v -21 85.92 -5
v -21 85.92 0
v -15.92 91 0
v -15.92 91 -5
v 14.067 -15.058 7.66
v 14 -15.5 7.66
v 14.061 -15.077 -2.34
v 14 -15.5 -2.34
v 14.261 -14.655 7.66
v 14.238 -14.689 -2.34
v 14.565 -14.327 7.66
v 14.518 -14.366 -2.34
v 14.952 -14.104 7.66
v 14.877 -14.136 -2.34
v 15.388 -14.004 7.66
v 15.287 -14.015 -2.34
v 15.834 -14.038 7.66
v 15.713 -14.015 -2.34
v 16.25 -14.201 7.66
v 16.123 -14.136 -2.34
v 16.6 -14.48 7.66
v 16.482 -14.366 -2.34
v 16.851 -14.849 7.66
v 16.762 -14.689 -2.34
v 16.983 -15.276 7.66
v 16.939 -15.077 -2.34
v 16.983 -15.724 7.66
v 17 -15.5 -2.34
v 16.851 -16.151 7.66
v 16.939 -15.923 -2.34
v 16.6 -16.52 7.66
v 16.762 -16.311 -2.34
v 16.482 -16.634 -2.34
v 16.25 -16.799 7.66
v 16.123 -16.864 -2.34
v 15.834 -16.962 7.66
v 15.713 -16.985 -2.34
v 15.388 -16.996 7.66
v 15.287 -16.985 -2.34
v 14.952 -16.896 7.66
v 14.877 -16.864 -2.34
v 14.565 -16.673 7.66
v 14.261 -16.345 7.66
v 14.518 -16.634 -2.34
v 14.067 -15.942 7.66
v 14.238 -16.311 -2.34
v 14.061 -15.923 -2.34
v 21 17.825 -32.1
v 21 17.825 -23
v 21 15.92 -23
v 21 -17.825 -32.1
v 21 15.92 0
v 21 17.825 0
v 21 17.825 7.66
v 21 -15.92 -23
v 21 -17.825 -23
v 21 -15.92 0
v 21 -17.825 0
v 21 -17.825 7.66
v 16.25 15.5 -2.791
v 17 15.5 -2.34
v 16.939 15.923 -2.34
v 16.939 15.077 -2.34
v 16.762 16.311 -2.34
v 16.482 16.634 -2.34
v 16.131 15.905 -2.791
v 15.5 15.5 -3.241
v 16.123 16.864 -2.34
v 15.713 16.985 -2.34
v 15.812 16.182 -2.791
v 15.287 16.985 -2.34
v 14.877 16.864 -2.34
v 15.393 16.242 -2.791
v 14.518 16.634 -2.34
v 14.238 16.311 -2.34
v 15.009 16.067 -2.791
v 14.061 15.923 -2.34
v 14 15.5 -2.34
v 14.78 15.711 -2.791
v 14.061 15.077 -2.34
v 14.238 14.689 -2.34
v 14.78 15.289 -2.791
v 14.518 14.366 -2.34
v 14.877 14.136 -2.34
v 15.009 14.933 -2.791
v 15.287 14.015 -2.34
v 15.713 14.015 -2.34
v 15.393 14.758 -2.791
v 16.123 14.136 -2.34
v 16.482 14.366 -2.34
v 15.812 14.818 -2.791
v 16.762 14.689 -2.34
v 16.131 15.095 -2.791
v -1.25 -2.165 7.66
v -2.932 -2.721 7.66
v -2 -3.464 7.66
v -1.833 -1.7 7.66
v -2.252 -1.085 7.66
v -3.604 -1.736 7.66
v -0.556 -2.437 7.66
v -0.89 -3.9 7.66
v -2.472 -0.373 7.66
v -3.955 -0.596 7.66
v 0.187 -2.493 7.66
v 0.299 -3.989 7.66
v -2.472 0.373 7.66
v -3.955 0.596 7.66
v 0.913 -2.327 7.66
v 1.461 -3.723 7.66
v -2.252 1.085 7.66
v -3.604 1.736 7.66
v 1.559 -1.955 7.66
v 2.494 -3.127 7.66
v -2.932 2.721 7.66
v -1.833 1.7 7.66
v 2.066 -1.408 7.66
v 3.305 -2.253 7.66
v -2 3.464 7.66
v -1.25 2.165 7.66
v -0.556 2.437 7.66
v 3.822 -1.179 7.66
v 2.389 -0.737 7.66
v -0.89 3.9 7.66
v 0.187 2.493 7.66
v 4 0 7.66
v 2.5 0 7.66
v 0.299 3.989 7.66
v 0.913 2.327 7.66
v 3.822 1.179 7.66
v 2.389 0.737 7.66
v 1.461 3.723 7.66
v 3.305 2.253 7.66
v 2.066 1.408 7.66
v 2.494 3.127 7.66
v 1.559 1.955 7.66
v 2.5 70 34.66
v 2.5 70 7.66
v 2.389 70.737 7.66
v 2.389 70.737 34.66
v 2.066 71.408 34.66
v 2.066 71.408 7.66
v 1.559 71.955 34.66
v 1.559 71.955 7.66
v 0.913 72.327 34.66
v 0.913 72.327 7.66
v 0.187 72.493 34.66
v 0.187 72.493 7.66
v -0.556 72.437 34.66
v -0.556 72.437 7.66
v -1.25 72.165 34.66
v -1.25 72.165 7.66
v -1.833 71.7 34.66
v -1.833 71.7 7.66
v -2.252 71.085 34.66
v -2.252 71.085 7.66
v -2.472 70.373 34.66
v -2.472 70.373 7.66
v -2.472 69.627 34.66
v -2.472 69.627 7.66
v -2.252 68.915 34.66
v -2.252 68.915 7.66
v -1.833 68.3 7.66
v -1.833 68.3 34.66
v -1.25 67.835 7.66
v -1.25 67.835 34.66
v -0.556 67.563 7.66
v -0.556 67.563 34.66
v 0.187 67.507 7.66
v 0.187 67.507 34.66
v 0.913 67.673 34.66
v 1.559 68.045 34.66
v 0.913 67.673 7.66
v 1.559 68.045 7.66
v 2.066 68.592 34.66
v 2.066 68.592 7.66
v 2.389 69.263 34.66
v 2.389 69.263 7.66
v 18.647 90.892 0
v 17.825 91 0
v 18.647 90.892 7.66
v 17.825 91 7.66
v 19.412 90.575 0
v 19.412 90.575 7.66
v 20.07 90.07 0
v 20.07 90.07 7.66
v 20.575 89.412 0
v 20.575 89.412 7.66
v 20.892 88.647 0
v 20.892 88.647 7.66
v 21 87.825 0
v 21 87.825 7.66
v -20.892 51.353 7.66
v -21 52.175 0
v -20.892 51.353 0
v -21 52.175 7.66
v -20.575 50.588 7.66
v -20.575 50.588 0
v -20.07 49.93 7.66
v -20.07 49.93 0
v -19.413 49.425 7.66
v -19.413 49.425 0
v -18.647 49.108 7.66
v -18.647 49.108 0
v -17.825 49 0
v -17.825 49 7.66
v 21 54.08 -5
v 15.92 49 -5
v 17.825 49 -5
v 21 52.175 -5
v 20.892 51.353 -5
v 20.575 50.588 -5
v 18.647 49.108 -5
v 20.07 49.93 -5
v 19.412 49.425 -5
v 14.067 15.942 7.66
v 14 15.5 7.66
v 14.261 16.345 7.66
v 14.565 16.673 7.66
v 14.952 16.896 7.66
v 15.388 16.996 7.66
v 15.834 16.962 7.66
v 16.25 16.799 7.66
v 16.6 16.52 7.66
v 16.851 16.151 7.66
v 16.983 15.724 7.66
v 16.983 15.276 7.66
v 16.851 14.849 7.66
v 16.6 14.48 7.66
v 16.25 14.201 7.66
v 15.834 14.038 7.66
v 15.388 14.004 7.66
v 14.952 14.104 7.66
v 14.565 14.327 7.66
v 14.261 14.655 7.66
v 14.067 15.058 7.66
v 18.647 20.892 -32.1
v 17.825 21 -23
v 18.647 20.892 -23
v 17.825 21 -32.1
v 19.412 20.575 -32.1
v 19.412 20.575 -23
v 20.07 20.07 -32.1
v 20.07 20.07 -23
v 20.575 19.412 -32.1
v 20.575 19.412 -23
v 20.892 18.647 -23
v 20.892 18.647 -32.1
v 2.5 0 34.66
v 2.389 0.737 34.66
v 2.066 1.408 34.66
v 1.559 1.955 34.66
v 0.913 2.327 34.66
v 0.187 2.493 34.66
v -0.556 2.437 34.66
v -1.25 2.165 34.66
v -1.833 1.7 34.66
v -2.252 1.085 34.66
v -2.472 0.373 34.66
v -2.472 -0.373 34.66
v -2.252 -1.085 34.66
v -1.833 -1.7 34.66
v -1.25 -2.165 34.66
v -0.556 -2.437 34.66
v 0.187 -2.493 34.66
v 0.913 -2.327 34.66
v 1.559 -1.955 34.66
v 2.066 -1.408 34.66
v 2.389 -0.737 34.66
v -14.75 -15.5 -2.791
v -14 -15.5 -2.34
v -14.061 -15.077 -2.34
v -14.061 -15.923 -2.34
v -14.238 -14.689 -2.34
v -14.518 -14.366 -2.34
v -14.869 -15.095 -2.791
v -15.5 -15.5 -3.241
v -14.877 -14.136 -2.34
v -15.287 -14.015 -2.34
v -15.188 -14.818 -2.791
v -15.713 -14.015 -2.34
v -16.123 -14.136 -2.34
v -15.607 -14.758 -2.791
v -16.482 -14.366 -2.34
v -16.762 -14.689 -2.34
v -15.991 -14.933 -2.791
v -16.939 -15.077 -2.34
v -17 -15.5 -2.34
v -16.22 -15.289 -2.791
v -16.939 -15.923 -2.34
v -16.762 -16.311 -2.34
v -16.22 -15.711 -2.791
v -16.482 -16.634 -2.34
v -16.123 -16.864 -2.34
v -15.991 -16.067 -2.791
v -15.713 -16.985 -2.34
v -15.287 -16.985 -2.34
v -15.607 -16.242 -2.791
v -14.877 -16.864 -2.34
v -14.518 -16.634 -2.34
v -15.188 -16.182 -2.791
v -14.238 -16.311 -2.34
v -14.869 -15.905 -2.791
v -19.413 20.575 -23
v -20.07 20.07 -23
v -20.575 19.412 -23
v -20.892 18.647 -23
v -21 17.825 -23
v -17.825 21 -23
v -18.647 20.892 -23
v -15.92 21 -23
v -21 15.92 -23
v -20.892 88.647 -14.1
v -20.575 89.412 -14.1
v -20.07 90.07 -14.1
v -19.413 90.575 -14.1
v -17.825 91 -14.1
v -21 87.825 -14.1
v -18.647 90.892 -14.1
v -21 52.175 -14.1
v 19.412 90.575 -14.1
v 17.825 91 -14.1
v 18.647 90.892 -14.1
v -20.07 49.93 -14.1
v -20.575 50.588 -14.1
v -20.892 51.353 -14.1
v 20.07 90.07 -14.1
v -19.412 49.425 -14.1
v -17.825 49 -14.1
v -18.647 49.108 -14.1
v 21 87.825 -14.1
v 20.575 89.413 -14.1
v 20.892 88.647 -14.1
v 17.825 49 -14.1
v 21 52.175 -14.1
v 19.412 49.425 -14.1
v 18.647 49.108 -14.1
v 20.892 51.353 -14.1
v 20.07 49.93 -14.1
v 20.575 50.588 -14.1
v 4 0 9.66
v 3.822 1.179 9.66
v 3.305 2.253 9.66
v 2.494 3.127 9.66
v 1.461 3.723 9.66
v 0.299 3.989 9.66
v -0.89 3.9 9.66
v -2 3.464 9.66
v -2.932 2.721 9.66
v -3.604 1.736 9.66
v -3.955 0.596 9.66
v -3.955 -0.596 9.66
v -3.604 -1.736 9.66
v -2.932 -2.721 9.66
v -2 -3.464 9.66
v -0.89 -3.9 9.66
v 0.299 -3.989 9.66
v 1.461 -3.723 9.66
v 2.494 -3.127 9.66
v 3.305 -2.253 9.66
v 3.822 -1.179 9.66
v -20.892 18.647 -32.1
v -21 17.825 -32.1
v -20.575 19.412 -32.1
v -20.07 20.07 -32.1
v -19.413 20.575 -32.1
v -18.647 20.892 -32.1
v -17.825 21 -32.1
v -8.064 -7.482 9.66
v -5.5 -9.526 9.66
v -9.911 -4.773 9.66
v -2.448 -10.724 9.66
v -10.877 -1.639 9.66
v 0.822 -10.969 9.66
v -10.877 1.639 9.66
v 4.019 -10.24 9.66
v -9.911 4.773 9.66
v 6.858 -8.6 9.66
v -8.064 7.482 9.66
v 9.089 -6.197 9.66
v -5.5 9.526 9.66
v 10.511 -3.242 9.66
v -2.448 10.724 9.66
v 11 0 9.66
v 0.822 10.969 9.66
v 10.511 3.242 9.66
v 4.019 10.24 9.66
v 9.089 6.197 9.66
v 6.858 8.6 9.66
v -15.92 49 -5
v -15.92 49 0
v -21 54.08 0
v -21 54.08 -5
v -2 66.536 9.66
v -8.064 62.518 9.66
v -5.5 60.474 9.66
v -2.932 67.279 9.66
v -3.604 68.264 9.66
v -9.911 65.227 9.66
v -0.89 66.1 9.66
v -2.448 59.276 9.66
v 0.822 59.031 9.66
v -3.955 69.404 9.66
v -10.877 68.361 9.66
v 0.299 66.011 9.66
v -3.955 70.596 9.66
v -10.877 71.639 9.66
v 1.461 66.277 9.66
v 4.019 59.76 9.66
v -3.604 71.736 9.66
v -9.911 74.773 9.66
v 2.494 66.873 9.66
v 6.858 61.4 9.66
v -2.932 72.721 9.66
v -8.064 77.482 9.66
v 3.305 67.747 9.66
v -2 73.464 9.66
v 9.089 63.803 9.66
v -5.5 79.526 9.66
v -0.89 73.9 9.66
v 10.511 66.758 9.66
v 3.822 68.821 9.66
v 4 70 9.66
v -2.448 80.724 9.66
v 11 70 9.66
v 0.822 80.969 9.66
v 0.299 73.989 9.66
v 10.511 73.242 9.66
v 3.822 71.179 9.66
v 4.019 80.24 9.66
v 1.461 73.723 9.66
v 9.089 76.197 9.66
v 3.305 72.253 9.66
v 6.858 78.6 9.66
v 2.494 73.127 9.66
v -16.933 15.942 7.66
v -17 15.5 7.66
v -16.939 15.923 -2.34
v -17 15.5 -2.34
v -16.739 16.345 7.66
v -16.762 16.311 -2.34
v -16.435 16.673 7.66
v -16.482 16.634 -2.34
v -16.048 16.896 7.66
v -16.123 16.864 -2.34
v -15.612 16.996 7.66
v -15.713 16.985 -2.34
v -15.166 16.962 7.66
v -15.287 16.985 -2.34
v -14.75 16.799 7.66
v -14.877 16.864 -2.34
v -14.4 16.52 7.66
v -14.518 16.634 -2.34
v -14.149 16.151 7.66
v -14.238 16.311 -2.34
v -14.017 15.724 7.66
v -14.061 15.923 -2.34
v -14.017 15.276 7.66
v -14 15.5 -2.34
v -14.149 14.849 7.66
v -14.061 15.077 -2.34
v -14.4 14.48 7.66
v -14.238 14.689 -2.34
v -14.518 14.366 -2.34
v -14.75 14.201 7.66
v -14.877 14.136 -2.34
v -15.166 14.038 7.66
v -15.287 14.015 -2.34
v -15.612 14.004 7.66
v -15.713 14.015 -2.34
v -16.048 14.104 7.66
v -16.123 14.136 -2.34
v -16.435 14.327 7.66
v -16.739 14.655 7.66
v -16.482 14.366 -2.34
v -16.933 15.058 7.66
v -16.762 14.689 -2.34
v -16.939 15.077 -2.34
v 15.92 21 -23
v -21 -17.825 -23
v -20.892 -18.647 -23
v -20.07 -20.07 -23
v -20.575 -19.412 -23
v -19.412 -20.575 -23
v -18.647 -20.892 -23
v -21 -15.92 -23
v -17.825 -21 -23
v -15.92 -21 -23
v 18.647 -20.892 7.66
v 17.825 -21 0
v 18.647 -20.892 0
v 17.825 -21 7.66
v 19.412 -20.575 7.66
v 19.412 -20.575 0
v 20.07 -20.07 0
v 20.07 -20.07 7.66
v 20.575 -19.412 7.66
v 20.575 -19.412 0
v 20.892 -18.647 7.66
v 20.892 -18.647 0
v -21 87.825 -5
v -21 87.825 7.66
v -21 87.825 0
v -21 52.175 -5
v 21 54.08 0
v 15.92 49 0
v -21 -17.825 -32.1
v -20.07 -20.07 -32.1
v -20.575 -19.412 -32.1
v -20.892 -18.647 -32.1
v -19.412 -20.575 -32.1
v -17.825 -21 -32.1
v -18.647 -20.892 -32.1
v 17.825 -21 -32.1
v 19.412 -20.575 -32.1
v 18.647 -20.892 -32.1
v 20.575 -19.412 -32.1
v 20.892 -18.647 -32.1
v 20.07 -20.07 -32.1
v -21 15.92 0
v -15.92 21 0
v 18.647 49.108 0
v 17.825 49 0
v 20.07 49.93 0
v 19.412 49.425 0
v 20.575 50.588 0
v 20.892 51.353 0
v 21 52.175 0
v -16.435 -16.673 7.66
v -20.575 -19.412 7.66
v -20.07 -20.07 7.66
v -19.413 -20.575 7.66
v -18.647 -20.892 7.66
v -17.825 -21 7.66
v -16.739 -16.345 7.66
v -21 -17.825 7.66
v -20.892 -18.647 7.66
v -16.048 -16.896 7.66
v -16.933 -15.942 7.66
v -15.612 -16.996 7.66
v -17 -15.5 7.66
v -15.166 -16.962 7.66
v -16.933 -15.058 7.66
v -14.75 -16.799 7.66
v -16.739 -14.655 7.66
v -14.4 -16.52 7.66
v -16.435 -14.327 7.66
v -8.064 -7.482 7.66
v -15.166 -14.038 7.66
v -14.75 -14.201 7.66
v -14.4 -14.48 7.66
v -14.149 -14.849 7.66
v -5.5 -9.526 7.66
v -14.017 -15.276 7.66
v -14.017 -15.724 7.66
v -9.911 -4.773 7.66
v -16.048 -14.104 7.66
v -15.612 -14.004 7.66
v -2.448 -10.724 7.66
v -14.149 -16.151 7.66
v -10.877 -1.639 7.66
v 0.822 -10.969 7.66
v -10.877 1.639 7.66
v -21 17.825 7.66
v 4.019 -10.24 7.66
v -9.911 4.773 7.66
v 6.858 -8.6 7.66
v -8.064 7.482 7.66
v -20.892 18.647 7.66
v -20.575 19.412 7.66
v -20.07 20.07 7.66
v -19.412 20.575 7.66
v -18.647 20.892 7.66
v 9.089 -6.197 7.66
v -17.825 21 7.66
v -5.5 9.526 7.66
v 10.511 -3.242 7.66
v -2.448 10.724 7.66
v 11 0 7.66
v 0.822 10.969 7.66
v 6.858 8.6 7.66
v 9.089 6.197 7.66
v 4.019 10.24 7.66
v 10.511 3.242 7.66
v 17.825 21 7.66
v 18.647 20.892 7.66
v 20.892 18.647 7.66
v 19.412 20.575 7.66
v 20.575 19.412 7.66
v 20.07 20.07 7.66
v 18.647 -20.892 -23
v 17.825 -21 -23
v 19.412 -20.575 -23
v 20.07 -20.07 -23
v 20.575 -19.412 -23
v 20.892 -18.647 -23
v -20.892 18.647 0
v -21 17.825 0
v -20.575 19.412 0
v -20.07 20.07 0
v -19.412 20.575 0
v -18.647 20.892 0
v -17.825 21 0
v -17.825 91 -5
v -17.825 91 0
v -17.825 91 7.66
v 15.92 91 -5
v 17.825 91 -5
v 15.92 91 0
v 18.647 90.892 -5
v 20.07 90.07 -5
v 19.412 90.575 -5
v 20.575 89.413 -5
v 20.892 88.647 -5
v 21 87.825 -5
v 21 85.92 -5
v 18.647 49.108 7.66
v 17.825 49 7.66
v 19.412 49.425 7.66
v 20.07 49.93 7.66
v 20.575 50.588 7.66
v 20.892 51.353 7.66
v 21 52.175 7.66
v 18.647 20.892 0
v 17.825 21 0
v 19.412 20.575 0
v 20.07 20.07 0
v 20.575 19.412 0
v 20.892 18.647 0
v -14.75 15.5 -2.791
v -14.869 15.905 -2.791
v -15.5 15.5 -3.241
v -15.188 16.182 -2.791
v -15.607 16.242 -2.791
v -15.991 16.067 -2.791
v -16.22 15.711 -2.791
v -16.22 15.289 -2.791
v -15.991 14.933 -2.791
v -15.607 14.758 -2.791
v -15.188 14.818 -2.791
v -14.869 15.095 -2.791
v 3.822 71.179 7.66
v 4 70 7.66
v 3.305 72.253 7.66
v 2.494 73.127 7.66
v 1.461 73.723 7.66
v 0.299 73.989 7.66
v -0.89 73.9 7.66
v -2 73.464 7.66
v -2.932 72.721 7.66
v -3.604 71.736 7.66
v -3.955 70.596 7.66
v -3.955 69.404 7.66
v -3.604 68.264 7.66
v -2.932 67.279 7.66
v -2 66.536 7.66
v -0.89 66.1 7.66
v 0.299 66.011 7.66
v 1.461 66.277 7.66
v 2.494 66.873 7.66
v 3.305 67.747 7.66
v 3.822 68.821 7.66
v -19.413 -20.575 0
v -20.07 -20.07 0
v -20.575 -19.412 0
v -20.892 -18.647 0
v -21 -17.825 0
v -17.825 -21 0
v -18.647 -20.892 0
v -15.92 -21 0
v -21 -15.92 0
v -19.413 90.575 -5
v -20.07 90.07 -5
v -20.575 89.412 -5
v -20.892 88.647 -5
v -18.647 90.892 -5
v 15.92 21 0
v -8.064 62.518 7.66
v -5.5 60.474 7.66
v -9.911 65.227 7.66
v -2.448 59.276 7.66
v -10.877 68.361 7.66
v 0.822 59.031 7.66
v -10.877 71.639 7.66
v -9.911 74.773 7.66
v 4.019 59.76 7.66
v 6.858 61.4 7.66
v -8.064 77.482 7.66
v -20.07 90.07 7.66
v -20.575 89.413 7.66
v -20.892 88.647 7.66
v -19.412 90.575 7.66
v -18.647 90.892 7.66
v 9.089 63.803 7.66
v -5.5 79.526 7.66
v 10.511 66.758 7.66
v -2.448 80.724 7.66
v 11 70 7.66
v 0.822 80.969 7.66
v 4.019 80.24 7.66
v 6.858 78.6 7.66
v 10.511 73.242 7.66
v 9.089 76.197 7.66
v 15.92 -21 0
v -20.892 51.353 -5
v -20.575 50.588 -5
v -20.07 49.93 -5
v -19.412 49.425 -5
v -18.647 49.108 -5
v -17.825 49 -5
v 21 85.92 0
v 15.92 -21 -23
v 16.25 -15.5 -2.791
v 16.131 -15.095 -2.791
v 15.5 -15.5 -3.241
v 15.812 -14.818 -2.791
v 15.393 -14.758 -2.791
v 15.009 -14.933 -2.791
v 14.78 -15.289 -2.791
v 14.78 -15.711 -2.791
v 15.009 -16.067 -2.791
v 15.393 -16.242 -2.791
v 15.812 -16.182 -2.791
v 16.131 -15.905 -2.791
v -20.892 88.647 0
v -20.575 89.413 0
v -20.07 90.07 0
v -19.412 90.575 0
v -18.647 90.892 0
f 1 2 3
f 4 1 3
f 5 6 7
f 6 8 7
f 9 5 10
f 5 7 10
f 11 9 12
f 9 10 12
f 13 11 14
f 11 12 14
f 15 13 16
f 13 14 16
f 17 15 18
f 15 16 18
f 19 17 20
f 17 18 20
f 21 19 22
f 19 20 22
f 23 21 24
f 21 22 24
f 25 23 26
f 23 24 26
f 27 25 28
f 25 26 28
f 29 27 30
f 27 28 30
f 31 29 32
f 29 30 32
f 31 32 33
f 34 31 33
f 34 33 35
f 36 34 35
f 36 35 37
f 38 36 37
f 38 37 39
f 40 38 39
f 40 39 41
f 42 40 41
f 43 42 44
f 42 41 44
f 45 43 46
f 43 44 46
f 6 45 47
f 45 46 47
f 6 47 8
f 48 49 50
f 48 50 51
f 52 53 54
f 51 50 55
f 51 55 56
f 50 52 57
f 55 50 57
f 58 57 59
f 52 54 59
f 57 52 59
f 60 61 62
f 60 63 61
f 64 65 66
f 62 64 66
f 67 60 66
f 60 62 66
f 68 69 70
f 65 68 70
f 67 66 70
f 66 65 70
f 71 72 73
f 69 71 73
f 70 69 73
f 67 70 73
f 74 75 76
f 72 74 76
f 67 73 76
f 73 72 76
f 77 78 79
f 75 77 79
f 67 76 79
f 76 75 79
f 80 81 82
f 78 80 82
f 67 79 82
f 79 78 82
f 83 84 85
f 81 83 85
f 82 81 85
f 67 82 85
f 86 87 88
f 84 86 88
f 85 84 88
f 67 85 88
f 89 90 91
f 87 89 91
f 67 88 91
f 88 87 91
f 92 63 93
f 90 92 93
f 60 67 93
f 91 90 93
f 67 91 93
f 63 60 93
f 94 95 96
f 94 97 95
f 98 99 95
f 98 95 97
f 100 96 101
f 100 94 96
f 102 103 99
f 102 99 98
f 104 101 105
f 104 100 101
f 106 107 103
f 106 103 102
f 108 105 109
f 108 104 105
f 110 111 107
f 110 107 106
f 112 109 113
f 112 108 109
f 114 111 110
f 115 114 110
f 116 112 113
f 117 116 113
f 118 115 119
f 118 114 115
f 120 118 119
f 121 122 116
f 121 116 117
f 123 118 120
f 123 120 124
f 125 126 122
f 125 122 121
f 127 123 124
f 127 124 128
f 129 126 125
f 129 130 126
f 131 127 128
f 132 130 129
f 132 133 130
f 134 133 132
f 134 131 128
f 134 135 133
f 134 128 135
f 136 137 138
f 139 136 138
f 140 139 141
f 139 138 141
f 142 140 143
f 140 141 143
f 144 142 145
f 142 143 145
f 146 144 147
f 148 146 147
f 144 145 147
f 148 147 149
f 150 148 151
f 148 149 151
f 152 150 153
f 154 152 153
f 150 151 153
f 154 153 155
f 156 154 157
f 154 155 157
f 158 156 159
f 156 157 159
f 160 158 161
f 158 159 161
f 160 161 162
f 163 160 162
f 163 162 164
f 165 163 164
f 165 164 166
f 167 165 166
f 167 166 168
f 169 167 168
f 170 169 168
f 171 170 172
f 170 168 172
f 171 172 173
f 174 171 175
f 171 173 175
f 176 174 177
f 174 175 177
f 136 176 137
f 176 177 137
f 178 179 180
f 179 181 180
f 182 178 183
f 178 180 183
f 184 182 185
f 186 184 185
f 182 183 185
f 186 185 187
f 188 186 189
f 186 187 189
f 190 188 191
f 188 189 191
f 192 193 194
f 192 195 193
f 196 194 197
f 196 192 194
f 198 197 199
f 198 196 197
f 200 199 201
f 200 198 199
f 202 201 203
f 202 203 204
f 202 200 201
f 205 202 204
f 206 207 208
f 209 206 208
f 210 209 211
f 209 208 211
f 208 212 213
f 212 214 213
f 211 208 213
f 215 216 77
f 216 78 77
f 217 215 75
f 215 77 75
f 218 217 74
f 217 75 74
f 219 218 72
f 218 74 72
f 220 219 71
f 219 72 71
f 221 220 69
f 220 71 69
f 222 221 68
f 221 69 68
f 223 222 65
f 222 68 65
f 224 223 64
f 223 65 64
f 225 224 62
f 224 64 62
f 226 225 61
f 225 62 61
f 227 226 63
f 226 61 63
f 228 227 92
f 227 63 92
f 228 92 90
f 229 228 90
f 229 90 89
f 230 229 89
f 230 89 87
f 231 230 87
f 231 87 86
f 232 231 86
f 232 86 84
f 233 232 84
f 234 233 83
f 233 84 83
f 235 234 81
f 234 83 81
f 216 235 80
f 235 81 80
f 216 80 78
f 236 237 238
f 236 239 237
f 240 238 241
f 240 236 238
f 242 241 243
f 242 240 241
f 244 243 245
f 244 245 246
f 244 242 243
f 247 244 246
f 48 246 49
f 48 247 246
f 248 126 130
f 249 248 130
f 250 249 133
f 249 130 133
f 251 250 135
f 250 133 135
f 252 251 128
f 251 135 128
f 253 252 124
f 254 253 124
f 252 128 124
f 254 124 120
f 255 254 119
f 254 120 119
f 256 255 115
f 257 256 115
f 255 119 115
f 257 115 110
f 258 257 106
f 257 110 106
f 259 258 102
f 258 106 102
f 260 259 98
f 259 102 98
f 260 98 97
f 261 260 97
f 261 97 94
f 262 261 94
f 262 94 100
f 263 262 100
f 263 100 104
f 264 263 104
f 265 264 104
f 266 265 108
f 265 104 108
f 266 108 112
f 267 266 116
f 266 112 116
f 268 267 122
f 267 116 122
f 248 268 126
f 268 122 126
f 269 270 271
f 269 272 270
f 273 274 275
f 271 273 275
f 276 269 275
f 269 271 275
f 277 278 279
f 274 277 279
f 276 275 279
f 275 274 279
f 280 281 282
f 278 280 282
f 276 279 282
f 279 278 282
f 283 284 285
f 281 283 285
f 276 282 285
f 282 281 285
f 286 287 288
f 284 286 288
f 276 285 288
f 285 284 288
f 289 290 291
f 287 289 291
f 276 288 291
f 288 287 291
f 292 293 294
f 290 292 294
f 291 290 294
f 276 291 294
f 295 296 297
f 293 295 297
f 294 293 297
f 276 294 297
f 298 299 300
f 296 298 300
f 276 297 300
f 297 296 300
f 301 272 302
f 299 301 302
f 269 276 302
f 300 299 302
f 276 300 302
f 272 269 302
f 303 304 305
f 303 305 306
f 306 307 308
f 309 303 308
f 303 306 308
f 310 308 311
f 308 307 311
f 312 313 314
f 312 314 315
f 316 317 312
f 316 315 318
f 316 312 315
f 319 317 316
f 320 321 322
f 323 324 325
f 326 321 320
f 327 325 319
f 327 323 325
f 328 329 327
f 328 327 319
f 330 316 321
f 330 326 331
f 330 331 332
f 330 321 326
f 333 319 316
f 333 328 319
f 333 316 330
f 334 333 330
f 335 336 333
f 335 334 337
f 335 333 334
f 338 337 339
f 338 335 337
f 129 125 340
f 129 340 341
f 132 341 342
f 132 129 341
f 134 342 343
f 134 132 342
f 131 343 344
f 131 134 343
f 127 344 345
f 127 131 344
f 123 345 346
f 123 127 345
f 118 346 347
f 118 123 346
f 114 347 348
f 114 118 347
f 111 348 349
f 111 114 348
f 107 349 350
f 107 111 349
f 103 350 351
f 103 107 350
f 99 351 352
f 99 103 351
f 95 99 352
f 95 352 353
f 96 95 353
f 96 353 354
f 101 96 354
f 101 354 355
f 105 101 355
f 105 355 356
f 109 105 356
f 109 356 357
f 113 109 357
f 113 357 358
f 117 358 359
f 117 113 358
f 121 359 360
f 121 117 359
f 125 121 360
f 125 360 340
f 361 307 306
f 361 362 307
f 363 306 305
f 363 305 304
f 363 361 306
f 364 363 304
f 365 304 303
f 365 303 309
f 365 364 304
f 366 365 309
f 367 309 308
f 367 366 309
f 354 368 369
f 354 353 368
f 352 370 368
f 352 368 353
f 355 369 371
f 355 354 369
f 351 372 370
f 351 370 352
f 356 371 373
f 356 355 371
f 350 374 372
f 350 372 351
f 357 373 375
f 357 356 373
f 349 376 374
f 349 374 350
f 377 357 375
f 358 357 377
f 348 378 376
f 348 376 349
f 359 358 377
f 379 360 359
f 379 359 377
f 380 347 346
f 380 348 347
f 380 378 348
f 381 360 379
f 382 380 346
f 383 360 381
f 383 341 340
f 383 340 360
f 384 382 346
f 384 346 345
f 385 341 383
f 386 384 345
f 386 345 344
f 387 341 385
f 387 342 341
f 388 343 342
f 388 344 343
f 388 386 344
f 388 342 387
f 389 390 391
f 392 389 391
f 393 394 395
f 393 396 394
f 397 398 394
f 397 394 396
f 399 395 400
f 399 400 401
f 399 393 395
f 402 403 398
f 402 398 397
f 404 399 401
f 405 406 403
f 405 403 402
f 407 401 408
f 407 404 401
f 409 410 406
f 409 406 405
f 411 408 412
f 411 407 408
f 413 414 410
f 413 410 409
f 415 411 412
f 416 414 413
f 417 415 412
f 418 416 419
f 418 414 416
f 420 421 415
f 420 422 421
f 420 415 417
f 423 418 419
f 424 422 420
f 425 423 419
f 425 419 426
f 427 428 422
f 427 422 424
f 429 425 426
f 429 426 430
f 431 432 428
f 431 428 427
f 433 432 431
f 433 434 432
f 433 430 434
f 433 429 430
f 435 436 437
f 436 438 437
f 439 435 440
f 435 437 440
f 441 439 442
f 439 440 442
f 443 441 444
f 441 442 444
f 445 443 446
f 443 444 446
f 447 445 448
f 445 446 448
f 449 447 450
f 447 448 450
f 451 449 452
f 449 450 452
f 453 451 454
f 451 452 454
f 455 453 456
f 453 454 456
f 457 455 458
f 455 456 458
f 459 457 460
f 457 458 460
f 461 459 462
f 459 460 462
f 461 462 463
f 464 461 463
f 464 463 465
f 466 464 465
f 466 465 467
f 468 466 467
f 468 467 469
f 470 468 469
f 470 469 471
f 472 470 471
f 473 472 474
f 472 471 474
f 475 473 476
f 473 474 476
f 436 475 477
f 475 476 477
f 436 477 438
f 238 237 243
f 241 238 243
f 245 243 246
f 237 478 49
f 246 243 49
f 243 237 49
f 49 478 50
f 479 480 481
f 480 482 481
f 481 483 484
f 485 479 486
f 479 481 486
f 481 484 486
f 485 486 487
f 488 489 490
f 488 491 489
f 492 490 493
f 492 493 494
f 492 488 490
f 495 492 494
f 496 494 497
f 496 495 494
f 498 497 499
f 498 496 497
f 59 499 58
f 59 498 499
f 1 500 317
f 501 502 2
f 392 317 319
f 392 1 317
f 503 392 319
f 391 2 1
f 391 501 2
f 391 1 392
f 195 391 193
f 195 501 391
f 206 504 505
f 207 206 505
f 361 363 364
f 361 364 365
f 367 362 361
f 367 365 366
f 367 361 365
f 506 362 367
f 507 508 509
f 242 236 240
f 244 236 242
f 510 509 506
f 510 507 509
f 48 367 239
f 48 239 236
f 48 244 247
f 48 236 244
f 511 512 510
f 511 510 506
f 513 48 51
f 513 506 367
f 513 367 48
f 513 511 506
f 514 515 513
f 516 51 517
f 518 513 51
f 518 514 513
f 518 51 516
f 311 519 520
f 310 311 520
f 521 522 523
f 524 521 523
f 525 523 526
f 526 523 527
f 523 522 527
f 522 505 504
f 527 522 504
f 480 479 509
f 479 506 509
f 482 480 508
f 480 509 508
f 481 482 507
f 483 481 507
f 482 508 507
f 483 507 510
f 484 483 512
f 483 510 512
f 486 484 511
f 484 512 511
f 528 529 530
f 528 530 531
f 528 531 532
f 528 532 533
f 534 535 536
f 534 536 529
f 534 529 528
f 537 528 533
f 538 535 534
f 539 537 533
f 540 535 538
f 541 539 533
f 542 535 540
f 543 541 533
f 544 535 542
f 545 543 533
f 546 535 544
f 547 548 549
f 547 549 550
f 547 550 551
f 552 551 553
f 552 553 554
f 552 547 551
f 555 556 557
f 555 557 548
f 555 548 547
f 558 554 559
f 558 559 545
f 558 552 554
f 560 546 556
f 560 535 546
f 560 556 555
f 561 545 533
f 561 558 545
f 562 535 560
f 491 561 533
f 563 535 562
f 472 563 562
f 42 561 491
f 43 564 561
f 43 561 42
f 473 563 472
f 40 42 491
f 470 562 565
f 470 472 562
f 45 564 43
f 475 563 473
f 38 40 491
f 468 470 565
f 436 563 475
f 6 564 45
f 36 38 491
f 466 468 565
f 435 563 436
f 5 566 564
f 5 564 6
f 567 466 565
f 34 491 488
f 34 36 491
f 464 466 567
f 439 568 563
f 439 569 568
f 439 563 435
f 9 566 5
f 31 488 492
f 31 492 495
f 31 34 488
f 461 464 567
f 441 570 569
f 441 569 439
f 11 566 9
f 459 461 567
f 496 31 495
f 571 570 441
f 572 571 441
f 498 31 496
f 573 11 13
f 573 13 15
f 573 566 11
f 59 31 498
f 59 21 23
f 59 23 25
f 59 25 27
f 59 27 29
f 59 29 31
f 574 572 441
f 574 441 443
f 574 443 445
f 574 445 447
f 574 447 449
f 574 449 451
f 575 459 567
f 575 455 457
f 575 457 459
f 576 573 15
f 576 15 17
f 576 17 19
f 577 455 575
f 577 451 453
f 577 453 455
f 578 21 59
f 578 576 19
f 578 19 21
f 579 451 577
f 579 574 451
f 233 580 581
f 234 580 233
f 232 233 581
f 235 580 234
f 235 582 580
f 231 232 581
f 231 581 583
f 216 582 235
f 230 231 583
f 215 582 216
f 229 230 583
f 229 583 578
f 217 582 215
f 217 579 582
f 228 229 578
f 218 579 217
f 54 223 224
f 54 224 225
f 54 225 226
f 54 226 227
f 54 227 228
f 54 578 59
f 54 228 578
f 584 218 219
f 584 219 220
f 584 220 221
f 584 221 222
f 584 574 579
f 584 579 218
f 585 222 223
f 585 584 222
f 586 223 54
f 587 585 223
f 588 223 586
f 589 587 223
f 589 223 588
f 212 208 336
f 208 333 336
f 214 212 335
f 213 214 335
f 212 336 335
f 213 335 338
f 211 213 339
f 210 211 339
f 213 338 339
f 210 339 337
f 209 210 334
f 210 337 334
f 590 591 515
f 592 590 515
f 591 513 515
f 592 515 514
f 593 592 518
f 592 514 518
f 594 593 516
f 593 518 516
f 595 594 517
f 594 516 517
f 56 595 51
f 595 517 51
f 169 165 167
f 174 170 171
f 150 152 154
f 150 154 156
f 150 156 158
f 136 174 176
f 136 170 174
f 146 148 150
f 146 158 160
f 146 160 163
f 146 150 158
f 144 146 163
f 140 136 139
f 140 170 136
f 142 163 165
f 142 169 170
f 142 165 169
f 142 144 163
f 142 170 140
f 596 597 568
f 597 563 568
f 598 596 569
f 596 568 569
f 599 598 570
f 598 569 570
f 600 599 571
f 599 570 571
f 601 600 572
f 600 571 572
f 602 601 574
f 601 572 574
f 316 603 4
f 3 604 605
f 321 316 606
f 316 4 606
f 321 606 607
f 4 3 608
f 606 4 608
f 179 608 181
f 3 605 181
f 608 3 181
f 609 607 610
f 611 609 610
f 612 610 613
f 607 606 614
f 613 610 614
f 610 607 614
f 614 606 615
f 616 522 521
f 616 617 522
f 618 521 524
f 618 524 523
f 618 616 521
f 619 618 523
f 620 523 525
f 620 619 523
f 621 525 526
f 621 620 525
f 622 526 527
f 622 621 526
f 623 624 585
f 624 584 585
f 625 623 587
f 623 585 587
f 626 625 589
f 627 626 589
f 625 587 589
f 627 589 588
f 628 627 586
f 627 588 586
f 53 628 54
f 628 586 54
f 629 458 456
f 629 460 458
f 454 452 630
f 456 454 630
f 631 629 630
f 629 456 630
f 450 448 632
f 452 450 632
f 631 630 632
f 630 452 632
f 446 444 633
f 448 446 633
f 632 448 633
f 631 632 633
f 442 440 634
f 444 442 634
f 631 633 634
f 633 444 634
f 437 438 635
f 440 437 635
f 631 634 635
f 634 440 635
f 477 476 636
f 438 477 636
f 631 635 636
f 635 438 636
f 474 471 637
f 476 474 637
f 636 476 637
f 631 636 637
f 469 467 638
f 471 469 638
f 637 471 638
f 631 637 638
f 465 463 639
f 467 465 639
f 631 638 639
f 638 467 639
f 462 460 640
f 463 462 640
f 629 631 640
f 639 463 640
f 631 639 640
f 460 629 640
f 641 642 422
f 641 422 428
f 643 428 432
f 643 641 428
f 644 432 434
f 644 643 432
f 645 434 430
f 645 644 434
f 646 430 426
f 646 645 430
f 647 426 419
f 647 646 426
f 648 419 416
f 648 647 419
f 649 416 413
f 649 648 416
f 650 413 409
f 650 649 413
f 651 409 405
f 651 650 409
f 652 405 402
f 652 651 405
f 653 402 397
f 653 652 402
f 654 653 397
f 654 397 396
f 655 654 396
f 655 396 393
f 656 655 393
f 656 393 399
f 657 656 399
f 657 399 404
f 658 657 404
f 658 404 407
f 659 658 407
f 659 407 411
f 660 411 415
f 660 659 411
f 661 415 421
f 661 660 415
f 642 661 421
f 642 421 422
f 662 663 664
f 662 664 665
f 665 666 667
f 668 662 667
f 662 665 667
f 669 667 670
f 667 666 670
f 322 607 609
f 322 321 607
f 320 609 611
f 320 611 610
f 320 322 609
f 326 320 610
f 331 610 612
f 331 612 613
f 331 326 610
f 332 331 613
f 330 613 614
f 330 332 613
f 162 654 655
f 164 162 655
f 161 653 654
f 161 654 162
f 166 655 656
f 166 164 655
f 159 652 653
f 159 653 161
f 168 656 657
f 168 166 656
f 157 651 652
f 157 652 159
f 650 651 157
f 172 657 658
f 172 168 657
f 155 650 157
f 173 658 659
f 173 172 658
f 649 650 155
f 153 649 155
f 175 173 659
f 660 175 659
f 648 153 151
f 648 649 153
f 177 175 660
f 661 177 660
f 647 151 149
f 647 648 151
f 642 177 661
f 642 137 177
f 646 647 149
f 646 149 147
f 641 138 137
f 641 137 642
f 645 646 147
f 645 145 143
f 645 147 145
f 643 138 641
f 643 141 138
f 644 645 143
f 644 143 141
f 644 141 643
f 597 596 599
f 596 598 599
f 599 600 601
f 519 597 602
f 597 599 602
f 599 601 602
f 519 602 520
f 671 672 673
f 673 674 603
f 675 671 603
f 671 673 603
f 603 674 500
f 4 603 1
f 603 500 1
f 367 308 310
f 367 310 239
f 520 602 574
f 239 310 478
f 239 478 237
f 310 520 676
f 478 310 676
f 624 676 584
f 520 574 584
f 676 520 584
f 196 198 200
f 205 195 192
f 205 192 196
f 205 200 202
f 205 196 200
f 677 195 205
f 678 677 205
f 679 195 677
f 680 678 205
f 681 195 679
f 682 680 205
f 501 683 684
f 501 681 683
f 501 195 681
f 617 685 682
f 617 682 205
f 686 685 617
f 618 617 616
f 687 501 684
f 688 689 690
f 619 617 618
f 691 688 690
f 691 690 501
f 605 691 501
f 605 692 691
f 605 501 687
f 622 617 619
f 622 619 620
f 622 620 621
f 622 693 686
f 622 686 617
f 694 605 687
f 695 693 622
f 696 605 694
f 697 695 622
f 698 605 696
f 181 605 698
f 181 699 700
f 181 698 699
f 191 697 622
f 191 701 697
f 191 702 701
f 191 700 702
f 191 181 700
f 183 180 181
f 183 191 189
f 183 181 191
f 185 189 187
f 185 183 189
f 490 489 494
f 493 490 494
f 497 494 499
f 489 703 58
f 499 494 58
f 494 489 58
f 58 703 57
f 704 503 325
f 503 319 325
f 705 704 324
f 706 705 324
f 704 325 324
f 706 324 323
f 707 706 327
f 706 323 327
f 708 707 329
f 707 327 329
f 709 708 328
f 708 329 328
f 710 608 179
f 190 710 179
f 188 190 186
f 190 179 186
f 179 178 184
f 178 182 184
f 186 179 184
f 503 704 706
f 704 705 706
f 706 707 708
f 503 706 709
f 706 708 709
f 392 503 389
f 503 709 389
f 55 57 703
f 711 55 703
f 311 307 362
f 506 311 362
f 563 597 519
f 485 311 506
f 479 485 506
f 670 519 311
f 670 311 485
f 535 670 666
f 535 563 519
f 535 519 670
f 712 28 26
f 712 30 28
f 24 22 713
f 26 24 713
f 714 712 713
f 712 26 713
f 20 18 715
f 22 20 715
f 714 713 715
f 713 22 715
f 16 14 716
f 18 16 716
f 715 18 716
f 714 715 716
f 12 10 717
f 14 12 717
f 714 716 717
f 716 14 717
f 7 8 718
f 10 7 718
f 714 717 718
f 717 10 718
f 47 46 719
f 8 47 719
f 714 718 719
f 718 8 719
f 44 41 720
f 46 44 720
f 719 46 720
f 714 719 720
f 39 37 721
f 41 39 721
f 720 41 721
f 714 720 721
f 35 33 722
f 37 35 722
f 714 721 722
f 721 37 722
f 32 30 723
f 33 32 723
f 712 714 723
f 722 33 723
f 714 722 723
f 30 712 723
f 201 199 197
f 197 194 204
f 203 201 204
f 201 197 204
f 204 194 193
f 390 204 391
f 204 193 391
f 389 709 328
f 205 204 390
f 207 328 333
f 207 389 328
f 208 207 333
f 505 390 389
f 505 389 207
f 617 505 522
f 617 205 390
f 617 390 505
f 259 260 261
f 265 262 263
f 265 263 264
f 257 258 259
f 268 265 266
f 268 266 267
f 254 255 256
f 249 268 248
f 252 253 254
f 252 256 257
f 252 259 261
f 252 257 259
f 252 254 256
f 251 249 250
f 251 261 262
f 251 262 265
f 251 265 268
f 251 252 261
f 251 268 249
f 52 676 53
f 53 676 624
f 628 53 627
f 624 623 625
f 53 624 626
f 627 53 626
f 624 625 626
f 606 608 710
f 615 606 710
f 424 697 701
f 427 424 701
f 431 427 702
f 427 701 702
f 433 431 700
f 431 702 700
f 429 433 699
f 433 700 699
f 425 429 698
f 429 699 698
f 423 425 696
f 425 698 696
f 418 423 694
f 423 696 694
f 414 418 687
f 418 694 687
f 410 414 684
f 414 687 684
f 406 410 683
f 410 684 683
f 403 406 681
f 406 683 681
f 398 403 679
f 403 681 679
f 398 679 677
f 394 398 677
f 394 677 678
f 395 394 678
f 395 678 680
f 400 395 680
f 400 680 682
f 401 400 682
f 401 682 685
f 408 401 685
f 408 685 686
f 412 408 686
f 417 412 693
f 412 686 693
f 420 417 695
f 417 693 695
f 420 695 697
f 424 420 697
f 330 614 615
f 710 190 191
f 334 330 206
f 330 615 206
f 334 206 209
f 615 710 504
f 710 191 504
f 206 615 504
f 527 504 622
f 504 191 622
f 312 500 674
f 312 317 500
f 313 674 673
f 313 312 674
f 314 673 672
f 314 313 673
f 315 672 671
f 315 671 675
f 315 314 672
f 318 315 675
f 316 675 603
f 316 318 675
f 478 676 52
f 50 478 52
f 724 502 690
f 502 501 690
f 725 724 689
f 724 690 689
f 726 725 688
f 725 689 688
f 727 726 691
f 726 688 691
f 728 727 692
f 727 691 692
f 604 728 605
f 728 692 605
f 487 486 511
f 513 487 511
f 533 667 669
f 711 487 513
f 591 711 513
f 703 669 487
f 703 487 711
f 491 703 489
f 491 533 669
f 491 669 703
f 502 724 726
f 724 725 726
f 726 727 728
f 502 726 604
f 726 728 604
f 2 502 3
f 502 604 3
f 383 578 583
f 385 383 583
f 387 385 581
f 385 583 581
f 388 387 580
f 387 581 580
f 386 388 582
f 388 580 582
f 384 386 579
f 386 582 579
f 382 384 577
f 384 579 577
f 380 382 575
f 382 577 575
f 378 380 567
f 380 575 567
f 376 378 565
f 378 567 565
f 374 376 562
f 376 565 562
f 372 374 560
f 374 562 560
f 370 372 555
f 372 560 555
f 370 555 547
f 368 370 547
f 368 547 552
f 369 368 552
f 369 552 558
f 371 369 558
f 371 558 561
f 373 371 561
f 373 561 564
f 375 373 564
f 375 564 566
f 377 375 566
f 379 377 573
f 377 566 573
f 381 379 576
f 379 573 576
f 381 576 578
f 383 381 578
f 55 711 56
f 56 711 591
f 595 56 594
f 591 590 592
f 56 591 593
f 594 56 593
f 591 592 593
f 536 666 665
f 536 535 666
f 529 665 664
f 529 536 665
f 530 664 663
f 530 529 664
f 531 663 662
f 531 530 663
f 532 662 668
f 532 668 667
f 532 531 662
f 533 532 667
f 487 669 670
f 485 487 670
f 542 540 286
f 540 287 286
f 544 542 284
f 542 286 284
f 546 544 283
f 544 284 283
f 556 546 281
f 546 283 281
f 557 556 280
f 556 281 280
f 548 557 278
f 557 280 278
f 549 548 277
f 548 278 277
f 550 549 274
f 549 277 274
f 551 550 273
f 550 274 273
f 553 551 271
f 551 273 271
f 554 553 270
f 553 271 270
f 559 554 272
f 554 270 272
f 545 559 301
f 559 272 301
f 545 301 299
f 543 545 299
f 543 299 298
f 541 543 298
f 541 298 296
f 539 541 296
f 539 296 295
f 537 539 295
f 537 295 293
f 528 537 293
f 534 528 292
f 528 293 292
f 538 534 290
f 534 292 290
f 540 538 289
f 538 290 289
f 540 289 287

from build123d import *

# Parameters (mm, degrees)
F0_W      = 42
F0_H      = 42
F1_DEPTH  = 7.66
F2_R      = 11
F2_R_2    = 4
F3_DEPTH  = 2
F5_DEPTH  = 23
F6_DEPTH  = 5
F7_W      = 42
F7_H      = 42
F9_DEPTH  = 9.1
F8_W      = 42
F8_H      = 42
F10_R     = 3.175
F10_2_R   = 3.175
F11_D     = 3
F11_DEPTH = 10
F11_TIP   = 0.9012909285
F2_R_3    = 2.5
F12_DEPTH = 27


# Not quite as in the source:
# - a feature names something its author has since deleted; it is built from what else it names


with BuildPart() as f1:
    # F0 (on Top) → F1 (new body)
    with BuildSketch(Plane.XY):
        Rectangle(F0_W, F0_H)
    extrude(amount=F1_DEPTH)

    # F2 (on face) → F3 (join)
    with BuildSketch(Plane.XY.offset(7.66)):
        Circle(F2_R)
        Circle(F2_R_2, mode=Mode.SUBTRACT)
    extrude(amount=F3_DEPTH)

    # F4 (on face) → F5 (join)
    with BuildSketch(Plane(origin=(0, 0, 0), x_dir=(1, 0, 0), z_dir=(0, 0, -1))):
        Polygon((-21, -15.92), (-15.92, -21), (15.92, -21), (21, -15.92), (21, 15.92), (15.92, 21), (-15.92, 21), (-21, 15.92), align=None)
    extrude(amount=F5_DEPTH)

    # F7 (on face) → F9 (join)
    with BuildSketch(Plane(origin=(0, 0, -23), x_dir=(1, 0, 0), z_dir=(0, 0, -1))):
        Rectangle(F7_W, F7_H)
    extrude(amount=F9_DEPTH)

    # F10
    f10_edges = [f1.edges().sort_by_distance(p)[0] for p in [
        (21, 21, 3.83),
        (21, -21, 3.83),
        (-21, -21, 3.83),
        (-21, 21, 3.83),
        (21, -21, -27.55),
        (-21, 21, -27.55),
        (-21, -21, -27.55),
        (21, 21, -27.55),
    ]]
    fillet(f10_edges, radius=F10_R)

    # F11
    with Locations(Plane.XY.offset(7.66)):
        with Locations((15.5, 15.5), (-15.5, 15.5), (15.5, -15.5), (-15.5, -15.5), (15.5, 54.5), (-15.5, 54.5), (-15.5, 85.5), (15.5, 85.5)):
            Hole(F11_D / 2, depth=F11_DEPTH)
            with Locations((0, 0, -(F11_DEPTH + F11_TIP / 2))):  # 118° drill point
                Cone(0, F11_D / 2, F11_TIP, mode=Mode.SUBTRACT)

    # F2 (on face) → F12 (join)
    with BuildSketch(Plane.XY.offset(7.66)):
        Circle(F2_R_3)
    extrude(amount=F12_DEPTH)


with BuildPart() as f1b:
    # F0 (on Top) → F1, piece 2 (new body)
    with BuildSketch(Plane.XY):
        with Locations((0, 70)):
            Rectangle(F0_W, F0_H)
    extrude(amount=F1_DEPTH)

    # F2 (on face) → F3, piece 2 (join)
    with BuildSketch(Plane.XY.offset(7.66)):
        with Locations((0, 70)):
            Circle(F2_R)
        with Locations((0, 70)):
            Circle(F2_R_2, mode=Mode.SUBTRACT)
    extrude(amount=F3_DEPTH)

    # F4 (on face) → F6 (join)
    with BuildSketch(Plane(origin=(0, 0, 0), x_dir=(1, 0, 0), z_dir=(0, 0, -1))):
        Polygon((-21, -85.92), (-15.92, -91), (15.92, -91), (21, -85.92), (21, -54.08), (15.92, -49), (-15.92, -49), (-21, -54.08), align=None)
    extrude(amount=F6_DEPTH)

    # F8 (on face) → F9, piece 2 (join)
    with BuildSketch(Plane(origin=(0, 0, -5), x_dir=(1, 0, 0), z_dir=(0, 0, -1))):
        with Locations((0, -70)):
            Rectangle(F8_W, F8_H)
    extrude(amount=F9_DEPTH)

    # F10#2
    f10_2_edges = [f1b.edges().sort_by_distance(p)[0] for p in [
        (-21, 91, 3.83),
        (-21, 49, 3.83),
        (21, 91, 3.83),
        (21, 49, 3.83),
        (-21, 49, -9.55),
        (-21, 91, -9.55),
        (21, 91, -9.55),
        (21, 49, -9.55),
    ]]
    fillet(f10_2_edges, radius=F10_2_R)

    # F2 (on face) → F12, piece 2 (join)
    with BuildSketch(Plane.XY.offset(7.66)):
        with Locations((0, 70)):
            Circle(F2_R_3)
    extrude(amount=F12_DEPTH)


solid = Compound([f1.part, f1b.part])
